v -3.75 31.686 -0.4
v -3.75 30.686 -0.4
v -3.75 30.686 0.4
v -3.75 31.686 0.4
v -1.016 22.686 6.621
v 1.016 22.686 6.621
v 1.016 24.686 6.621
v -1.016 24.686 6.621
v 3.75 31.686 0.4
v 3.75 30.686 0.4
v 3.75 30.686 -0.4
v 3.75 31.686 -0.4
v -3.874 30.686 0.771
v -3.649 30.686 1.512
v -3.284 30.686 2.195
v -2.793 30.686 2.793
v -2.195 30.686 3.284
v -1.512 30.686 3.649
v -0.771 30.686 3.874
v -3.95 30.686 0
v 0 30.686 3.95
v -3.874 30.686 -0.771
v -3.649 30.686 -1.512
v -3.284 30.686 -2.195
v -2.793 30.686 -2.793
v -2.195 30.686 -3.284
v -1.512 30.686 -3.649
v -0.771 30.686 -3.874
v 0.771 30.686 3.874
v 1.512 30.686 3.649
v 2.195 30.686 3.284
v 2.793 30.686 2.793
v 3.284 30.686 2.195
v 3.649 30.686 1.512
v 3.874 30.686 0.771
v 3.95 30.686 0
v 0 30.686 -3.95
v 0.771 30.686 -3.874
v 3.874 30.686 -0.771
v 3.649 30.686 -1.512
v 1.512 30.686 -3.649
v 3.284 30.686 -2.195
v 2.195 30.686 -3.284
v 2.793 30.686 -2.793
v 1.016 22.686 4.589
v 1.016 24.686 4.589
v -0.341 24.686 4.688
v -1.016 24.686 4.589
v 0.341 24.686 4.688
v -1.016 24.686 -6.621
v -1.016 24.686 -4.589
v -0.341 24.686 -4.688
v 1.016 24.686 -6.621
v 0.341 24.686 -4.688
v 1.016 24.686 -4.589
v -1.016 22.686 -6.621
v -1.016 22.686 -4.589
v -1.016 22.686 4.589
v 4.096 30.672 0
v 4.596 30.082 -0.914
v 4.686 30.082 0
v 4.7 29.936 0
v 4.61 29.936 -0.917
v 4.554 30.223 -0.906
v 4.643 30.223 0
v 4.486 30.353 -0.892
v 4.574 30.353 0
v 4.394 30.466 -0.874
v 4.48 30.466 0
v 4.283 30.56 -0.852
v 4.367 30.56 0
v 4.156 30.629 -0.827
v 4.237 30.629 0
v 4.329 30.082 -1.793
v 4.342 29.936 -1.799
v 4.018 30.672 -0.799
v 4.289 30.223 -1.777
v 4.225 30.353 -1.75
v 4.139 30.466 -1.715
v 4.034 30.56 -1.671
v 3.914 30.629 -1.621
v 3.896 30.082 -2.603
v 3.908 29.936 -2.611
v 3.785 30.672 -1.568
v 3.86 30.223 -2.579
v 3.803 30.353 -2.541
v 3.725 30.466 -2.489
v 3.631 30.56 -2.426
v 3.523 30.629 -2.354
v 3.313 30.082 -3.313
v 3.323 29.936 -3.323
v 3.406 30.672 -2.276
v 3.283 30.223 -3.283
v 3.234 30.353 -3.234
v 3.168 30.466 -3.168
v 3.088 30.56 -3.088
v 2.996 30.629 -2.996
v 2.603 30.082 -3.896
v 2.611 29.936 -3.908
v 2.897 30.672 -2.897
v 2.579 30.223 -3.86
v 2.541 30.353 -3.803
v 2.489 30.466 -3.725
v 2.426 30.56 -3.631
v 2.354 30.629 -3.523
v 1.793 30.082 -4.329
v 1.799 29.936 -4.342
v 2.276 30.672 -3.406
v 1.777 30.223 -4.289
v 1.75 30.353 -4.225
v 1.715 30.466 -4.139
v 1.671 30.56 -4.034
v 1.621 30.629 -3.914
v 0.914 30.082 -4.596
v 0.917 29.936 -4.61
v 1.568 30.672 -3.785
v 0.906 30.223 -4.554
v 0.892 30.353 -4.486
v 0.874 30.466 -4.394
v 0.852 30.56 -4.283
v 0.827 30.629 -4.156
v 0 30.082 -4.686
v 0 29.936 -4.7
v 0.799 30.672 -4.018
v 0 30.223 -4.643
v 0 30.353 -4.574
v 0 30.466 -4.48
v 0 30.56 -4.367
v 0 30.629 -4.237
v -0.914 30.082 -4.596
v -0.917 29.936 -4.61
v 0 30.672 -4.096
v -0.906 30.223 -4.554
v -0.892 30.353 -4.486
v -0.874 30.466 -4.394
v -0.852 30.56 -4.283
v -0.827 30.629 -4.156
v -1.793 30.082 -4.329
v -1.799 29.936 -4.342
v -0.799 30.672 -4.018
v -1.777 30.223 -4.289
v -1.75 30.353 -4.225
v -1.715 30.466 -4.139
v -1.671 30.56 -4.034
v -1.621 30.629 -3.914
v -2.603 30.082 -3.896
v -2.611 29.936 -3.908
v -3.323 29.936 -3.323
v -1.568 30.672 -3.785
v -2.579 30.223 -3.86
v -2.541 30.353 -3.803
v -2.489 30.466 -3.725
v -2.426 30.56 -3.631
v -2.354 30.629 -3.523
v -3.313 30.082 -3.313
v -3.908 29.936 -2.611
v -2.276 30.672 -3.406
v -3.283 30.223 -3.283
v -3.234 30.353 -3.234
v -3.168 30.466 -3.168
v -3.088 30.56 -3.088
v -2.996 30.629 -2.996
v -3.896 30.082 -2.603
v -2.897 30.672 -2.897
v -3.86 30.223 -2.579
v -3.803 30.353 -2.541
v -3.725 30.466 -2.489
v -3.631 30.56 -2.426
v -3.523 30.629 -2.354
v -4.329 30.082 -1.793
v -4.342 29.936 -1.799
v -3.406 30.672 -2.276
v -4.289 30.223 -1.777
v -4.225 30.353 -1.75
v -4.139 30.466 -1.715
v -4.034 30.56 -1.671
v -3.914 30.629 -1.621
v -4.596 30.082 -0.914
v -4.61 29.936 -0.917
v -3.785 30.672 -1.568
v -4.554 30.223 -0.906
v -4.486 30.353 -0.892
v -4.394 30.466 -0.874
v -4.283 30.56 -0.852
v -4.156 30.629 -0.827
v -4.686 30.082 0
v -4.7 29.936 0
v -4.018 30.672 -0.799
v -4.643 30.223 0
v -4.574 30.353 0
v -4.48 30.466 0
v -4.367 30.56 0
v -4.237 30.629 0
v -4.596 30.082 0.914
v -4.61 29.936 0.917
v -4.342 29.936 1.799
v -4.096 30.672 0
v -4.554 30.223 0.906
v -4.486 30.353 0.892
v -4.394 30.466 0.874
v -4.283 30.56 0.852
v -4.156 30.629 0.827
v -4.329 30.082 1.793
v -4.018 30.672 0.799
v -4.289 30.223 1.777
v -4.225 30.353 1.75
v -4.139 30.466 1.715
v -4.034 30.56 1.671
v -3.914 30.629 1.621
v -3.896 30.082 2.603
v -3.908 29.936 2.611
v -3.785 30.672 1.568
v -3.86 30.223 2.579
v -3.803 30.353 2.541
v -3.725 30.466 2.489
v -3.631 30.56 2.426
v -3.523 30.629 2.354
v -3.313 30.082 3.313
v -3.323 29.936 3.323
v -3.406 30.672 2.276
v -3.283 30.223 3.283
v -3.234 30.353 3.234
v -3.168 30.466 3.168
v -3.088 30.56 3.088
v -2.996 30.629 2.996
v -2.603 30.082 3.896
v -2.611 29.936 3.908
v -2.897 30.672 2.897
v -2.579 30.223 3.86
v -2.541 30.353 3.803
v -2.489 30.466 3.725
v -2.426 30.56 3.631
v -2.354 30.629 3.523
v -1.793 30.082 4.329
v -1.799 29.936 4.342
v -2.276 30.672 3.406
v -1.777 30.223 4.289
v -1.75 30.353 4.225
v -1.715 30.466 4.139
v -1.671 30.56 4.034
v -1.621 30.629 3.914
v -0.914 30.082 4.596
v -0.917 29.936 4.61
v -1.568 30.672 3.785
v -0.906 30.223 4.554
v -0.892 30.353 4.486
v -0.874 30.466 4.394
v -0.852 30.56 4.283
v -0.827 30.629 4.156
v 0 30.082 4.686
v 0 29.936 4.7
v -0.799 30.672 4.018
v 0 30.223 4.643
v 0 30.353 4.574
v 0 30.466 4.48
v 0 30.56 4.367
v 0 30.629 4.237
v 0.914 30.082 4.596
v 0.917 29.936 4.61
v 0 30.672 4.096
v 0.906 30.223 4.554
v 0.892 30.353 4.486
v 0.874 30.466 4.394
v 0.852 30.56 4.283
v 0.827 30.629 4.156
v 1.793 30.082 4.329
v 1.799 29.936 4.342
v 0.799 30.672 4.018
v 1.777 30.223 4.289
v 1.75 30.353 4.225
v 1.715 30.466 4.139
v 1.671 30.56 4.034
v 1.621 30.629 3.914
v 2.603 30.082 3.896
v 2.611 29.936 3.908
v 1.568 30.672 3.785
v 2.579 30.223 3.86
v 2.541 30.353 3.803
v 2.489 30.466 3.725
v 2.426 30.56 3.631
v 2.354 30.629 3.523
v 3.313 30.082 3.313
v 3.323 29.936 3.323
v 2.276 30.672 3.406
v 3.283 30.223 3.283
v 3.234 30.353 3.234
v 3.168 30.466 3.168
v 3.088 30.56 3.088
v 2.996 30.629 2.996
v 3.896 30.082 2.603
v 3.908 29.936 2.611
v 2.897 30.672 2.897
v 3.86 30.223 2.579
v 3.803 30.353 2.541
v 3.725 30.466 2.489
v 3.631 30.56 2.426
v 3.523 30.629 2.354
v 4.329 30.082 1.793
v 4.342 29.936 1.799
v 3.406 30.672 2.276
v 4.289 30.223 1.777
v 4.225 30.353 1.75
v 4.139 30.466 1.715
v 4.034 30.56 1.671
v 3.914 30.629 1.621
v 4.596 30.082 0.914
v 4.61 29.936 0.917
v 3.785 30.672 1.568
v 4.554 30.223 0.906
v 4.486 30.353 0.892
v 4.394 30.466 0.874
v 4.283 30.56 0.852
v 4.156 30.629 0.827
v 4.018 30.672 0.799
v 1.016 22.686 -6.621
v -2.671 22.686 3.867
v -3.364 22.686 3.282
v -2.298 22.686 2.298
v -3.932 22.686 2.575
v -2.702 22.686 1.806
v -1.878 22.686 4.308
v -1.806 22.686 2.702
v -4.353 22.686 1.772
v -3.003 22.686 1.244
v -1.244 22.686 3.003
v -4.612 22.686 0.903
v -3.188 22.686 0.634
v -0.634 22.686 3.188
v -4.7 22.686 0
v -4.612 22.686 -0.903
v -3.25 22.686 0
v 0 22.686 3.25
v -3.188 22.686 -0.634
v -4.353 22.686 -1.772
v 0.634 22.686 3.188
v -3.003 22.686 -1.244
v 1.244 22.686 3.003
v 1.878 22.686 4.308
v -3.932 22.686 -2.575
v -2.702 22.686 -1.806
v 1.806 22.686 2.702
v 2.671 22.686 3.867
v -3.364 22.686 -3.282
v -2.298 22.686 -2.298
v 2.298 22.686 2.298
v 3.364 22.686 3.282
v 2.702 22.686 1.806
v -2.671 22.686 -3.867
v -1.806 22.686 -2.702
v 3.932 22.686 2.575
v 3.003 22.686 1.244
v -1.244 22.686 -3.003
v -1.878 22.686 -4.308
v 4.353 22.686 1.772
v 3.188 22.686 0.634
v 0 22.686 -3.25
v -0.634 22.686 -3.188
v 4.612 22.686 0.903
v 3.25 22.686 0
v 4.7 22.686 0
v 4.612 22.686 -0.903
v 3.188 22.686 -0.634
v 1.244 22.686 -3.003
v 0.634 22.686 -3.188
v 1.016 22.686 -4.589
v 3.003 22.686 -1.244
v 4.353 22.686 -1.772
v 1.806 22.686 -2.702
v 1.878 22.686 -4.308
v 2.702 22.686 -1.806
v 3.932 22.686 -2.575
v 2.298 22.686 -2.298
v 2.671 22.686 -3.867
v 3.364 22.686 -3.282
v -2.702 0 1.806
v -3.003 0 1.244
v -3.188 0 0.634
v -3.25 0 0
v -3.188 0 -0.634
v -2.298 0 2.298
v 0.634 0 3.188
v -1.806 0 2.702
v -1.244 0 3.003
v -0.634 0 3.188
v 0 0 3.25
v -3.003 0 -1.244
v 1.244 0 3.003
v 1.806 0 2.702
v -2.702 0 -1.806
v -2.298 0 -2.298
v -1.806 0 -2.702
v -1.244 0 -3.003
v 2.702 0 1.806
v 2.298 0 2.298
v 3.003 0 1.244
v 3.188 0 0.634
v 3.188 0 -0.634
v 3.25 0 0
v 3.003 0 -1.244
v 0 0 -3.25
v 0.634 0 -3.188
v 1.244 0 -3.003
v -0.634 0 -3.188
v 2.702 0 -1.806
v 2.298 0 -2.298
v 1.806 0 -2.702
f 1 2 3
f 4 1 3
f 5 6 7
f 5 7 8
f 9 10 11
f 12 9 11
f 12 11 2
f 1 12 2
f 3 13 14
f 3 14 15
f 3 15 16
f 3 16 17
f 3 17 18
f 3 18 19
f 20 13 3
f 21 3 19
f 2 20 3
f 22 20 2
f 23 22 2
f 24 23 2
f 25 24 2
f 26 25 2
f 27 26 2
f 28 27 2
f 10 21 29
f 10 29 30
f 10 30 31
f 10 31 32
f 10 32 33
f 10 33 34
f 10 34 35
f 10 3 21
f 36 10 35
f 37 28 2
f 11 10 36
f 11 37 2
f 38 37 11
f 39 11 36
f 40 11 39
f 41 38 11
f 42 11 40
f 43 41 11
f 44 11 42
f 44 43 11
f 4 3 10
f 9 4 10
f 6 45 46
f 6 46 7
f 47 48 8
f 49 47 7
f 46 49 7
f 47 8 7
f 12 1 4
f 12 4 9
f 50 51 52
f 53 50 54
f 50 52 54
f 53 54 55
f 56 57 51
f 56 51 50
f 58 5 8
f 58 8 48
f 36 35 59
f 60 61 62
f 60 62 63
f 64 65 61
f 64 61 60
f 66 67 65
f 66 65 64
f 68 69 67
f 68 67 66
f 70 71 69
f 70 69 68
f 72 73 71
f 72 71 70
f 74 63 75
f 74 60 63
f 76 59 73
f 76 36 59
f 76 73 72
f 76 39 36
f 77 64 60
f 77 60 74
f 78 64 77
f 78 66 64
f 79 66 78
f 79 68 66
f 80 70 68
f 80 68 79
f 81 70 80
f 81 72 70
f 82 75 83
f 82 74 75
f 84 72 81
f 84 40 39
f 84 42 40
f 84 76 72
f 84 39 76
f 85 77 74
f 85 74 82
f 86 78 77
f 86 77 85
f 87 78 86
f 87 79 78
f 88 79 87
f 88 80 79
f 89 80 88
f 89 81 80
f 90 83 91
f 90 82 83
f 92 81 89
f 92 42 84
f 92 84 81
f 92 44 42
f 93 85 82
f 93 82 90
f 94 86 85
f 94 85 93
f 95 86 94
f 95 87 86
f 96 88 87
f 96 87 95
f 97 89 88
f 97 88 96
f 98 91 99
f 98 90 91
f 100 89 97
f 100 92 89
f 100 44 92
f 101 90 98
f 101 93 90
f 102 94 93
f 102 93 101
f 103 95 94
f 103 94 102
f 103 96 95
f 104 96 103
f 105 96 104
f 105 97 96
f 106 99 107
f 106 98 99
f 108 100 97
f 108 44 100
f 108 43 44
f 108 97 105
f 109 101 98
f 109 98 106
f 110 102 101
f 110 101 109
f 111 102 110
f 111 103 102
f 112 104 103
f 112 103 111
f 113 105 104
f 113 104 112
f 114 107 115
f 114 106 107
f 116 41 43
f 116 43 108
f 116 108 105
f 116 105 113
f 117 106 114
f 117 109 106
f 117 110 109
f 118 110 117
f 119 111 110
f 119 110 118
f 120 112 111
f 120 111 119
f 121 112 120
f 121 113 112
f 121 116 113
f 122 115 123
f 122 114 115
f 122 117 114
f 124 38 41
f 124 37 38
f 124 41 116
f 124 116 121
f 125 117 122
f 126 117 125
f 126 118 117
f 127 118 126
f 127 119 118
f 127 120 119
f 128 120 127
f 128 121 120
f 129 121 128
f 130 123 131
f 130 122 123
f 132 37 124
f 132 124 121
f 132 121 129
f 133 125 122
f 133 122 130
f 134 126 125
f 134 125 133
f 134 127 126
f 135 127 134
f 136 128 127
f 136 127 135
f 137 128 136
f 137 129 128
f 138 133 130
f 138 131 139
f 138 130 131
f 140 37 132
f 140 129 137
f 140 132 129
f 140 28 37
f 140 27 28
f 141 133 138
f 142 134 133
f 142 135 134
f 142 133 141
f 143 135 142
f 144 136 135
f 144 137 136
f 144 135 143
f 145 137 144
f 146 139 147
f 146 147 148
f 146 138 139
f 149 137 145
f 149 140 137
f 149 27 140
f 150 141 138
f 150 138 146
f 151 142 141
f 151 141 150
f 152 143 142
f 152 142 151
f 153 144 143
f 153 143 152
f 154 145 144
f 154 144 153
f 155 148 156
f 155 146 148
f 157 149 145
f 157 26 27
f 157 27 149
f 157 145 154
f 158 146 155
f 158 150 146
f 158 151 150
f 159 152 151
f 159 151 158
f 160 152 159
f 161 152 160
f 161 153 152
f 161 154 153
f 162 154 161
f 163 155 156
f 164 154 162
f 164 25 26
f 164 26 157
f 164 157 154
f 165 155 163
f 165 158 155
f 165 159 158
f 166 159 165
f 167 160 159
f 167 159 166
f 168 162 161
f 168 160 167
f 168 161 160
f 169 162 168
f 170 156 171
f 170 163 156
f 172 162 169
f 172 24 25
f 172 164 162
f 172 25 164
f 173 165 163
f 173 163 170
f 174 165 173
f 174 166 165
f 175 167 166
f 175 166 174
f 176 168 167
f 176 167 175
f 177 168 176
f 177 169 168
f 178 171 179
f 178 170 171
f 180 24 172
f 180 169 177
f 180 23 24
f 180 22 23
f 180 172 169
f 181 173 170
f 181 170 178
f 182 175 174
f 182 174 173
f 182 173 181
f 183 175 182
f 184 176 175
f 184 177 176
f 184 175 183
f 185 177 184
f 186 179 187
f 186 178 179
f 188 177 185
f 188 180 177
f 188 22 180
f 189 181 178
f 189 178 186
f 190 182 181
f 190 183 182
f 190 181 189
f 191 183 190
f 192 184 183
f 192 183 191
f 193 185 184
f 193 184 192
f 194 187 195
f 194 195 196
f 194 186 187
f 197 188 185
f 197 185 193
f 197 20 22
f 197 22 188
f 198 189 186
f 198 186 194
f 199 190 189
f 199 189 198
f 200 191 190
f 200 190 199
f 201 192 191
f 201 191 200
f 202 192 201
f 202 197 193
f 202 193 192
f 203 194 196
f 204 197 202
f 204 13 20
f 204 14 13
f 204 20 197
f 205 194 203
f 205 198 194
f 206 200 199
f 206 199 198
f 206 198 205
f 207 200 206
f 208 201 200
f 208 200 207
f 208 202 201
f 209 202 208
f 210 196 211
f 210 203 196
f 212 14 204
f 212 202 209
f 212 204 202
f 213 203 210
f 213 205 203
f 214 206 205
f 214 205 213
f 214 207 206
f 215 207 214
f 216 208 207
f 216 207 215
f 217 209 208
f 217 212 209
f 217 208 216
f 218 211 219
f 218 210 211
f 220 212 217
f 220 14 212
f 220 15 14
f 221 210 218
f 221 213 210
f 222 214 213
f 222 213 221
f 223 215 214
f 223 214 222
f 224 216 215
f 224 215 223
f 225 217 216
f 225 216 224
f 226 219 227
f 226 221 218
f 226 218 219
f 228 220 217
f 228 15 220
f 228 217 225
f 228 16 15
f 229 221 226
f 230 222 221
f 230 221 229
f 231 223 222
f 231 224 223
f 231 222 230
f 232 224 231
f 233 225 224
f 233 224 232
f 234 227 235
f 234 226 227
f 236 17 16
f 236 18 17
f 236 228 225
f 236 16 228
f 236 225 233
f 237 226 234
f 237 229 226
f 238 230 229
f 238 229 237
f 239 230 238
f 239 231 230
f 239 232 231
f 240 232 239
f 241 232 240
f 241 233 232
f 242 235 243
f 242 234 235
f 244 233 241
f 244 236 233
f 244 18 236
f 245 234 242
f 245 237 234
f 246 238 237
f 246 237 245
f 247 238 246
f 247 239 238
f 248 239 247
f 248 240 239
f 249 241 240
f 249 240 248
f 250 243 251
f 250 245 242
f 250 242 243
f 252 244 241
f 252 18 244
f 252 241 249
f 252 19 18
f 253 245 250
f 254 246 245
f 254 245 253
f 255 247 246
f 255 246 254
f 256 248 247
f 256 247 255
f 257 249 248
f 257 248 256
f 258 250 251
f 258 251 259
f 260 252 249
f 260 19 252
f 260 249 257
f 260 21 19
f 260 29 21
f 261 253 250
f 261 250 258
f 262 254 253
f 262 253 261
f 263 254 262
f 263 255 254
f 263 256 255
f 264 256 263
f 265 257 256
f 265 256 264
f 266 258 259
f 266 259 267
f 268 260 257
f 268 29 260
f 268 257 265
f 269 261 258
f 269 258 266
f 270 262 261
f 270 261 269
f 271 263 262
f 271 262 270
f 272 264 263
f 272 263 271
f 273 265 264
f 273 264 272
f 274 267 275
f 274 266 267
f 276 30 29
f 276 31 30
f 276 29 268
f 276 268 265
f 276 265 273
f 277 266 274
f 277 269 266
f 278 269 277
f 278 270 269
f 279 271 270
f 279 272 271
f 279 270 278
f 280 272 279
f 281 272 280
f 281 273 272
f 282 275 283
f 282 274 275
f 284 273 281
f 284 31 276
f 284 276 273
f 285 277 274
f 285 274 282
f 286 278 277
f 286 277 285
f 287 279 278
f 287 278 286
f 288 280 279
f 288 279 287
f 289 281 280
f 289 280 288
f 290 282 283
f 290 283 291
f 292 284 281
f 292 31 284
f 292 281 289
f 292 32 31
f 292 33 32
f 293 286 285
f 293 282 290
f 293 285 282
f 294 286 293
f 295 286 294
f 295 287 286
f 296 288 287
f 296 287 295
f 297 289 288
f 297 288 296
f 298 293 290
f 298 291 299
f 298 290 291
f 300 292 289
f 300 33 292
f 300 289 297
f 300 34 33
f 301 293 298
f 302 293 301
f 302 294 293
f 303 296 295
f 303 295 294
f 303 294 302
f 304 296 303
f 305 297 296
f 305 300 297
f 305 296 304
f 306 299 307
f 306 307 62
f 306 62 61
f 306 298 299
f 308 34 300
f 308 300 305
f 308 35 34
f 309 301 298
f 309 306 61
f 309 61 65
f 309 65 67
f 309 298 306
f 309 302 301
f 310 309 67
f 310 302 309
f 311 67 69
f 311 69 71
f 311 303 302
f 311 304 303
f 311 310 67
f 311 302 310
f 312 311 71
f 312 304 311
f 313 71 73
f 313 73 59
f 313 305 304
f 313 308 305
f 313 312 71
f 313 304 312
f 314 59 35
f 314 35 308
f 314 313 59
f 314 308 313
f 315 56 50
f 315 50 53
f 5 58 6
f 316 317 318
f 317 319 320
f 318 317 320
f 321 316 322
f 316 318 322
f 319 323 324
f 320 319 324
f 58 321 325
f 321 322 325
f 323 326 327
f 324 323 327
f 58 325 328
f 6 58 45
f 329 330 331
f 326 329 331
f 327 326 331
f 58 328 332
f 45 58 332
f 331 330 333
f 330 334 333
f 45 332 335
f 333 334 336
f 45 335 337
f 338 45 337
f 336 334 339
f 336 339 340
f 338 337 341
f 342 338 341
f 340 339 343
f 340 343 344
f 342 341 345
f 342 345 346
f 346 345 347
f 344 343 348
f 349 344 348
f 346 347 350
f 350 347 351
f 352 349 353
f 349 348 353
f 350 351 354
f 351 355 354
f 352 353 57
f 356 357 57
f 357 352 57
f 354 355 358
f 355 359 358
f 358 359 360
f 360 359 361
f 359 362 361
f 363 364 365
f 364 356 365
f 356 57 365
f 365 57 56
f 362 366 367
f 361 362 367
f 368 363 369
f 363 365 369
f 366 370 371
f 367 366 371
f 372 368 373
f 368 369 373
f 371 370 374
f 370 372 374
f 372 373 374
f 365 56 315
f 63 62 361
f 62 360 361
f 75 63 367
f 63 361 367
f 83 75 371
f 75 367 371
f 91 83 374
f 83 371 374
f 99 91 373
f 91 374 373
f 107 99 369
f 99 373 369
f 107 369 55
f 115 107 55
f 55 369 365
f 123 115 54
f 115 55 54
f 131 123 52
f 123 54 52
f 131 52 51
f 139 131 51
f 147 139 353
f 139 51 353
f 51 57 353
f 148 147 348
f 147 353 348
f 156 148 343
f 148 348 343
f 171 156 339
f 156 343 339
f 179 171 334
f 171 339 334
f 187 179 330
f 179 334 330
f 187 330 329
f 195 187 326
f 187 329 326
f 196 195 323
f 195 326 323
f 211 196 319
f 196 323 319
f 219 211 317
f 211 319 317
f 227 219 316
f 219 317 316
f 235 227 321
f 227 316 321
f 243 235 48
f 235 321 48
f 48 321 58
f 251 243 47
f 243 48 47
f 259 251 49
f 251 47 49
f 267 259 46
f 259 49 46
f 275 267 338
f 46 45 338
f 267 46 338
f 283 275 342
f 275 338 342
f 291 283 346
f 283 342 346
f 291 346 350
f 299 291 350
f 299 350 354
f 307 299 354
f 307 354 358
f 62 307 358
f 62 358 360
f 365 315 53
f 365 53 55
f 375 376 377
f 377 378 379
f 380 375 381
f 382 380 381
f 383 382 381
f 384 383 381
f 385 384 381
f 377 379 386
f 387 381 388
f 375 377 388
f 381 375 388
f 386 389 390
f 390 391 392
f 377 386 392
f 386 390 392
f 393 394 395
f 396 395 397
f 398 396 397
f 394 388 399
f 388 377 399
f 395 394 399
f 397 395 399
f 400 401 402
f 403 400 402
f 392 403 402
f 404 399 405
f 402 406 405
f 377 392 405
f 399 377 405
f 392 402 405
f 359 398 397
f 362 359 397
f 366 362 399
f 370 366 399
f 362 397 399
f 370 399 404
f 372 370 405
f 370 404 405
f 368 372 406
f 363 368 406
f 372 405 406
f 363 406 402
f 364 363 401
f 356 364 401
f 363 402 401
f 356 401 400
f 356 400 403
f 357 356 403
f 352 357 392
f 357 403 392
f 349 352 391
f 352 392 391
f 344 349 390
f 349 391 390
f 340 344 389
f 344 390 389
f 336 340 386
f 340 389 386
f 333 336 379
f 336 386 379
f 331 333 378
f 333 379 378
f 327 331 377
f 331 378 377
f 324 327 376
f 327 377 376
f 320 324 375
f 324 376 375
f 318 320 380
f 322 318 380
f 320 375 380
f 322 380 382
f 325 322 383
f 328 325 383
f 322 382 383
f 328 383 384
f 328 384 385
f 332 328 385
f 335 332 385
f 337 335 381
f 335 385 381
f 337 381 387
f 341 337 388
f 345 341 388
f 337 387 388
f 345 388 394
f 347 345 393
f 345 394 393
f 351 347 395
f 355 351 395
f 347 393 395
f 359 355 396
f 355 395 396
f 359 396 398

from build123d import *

# Parameters (mm, degrees)
SKETCH1_R           = 3.25
BOSS_EXTRUDE1_DEPTH = 22.686
SKETCH6_R           = 4.7
BOSS_EXTRUDE2_DEPTH = 8
BOSS_EXTRUDE3_DEPTH = 1
FILLET1_R           = 0.75
SKETCH9_W           = 0.8
SKETCH9_H           = 3.35
CUT_EXTRUDE3_DEPTH  = 1
BOSS_EXTRUDE4_DEPTH = 2


with BuildPart() as part:
    # Sketch1 → Boss-Extrude1 (new body)
    with BuildSketch(Plane(origin=(0, 0, 0), x_dir=(1, 0, 0), z_dir=(0, 1, 0))):
        Circle(SKETCH1_R)
    extrude(amount=BOSS_EXTRUDE1_DEPTH)

    # Sketch6 → Boss-Extrude2 (add)
    with BuildSketch(Plane(origin=(0, 22.686, 0), x_dir=(1, 0, 0), z_dir=(0, 1, 0))):
        Circle(SKETCH6_R)
    extrude(amount=BOSS_EXTRUDE2_DEPTH)

    # Sketch8 → Boss-Extrude3 (add)
    with BuildSketch(Plane(origin=(0, 30.686, 0), x_dir=(1, 0, 0), z_dir=(0, 1, 0))):
        Polygon((0.4, 3.75), (-0.4, 3.75), (-0.4, 0.4), (-3.75, 0.4), (-3.75, -0.4), (-0.4, -0.4), (-0.4, -3.75), (0.4, -3.75), (0.4, -0.4), (3.75, -0.4), (3.75, 0.4), (0.4, 0.4), align=None)
    extrude(amount=BOSS_EXTRUDE3_DEPTH)

    # Fillet1
    fillet1_edges = [part.edges().sort_by_distance(p)[0] for p in [
        (-4.7, 30.686, 0),
    ]]
    fillet(fillet1_edges, radius=FILLET1_R)

    # Sketch9 → Cut-Extrude3 (cut)
    with BuildSketch(Plane(origin=(0, 30.686, 0), x_dir=(1, 0, 0), z_dir=(0, 1, 0))):
        with Locations((0, 2.075)):
            Rectangle(SKETCH9_W, SKETCH9_H)
        with Locations((0, -2.075)):
            Rectangle(SKETCH9_W, SKETCH9_H)
    extrude(amount=CUT_EXTRUDE3_DEPTH, mode=Mode.SUBTRACT)

    # Sketch10 → Boss-Extrude4 (add)
    with BuildSketch(Plane.XZ.offset(-22.686)):
        with BuildLine():
            Line((-1.016, 6.620871757), (-1.016, 4.588871757))
            ThreePointArc((-1.016, 4.588871757), (0, 4.7), (1.016, 4.588871757))
            Line((1.016, 4.588871757), (1.016, 6.620871757))
            Line((1.016, 6.620871757), (-1.016, 6.620871757))
        make_face()
        with BuildLine():
            ThreePointArc((1.016, -4.588871757), (0, -4.7), (-1.016, -4.588871757))
            Line((-1.016, -4.588871757), (-1.016, -6.620871757))
            Line((-1.016, -6.620871757), (1.016, -6.620871757))
            Line((1.016, -6.620871757), (1.016, -4.588871757))
        make_face()
    extrude(amount=-BOSS_EXTRUDE4_DEPTH)


solid = part.part
